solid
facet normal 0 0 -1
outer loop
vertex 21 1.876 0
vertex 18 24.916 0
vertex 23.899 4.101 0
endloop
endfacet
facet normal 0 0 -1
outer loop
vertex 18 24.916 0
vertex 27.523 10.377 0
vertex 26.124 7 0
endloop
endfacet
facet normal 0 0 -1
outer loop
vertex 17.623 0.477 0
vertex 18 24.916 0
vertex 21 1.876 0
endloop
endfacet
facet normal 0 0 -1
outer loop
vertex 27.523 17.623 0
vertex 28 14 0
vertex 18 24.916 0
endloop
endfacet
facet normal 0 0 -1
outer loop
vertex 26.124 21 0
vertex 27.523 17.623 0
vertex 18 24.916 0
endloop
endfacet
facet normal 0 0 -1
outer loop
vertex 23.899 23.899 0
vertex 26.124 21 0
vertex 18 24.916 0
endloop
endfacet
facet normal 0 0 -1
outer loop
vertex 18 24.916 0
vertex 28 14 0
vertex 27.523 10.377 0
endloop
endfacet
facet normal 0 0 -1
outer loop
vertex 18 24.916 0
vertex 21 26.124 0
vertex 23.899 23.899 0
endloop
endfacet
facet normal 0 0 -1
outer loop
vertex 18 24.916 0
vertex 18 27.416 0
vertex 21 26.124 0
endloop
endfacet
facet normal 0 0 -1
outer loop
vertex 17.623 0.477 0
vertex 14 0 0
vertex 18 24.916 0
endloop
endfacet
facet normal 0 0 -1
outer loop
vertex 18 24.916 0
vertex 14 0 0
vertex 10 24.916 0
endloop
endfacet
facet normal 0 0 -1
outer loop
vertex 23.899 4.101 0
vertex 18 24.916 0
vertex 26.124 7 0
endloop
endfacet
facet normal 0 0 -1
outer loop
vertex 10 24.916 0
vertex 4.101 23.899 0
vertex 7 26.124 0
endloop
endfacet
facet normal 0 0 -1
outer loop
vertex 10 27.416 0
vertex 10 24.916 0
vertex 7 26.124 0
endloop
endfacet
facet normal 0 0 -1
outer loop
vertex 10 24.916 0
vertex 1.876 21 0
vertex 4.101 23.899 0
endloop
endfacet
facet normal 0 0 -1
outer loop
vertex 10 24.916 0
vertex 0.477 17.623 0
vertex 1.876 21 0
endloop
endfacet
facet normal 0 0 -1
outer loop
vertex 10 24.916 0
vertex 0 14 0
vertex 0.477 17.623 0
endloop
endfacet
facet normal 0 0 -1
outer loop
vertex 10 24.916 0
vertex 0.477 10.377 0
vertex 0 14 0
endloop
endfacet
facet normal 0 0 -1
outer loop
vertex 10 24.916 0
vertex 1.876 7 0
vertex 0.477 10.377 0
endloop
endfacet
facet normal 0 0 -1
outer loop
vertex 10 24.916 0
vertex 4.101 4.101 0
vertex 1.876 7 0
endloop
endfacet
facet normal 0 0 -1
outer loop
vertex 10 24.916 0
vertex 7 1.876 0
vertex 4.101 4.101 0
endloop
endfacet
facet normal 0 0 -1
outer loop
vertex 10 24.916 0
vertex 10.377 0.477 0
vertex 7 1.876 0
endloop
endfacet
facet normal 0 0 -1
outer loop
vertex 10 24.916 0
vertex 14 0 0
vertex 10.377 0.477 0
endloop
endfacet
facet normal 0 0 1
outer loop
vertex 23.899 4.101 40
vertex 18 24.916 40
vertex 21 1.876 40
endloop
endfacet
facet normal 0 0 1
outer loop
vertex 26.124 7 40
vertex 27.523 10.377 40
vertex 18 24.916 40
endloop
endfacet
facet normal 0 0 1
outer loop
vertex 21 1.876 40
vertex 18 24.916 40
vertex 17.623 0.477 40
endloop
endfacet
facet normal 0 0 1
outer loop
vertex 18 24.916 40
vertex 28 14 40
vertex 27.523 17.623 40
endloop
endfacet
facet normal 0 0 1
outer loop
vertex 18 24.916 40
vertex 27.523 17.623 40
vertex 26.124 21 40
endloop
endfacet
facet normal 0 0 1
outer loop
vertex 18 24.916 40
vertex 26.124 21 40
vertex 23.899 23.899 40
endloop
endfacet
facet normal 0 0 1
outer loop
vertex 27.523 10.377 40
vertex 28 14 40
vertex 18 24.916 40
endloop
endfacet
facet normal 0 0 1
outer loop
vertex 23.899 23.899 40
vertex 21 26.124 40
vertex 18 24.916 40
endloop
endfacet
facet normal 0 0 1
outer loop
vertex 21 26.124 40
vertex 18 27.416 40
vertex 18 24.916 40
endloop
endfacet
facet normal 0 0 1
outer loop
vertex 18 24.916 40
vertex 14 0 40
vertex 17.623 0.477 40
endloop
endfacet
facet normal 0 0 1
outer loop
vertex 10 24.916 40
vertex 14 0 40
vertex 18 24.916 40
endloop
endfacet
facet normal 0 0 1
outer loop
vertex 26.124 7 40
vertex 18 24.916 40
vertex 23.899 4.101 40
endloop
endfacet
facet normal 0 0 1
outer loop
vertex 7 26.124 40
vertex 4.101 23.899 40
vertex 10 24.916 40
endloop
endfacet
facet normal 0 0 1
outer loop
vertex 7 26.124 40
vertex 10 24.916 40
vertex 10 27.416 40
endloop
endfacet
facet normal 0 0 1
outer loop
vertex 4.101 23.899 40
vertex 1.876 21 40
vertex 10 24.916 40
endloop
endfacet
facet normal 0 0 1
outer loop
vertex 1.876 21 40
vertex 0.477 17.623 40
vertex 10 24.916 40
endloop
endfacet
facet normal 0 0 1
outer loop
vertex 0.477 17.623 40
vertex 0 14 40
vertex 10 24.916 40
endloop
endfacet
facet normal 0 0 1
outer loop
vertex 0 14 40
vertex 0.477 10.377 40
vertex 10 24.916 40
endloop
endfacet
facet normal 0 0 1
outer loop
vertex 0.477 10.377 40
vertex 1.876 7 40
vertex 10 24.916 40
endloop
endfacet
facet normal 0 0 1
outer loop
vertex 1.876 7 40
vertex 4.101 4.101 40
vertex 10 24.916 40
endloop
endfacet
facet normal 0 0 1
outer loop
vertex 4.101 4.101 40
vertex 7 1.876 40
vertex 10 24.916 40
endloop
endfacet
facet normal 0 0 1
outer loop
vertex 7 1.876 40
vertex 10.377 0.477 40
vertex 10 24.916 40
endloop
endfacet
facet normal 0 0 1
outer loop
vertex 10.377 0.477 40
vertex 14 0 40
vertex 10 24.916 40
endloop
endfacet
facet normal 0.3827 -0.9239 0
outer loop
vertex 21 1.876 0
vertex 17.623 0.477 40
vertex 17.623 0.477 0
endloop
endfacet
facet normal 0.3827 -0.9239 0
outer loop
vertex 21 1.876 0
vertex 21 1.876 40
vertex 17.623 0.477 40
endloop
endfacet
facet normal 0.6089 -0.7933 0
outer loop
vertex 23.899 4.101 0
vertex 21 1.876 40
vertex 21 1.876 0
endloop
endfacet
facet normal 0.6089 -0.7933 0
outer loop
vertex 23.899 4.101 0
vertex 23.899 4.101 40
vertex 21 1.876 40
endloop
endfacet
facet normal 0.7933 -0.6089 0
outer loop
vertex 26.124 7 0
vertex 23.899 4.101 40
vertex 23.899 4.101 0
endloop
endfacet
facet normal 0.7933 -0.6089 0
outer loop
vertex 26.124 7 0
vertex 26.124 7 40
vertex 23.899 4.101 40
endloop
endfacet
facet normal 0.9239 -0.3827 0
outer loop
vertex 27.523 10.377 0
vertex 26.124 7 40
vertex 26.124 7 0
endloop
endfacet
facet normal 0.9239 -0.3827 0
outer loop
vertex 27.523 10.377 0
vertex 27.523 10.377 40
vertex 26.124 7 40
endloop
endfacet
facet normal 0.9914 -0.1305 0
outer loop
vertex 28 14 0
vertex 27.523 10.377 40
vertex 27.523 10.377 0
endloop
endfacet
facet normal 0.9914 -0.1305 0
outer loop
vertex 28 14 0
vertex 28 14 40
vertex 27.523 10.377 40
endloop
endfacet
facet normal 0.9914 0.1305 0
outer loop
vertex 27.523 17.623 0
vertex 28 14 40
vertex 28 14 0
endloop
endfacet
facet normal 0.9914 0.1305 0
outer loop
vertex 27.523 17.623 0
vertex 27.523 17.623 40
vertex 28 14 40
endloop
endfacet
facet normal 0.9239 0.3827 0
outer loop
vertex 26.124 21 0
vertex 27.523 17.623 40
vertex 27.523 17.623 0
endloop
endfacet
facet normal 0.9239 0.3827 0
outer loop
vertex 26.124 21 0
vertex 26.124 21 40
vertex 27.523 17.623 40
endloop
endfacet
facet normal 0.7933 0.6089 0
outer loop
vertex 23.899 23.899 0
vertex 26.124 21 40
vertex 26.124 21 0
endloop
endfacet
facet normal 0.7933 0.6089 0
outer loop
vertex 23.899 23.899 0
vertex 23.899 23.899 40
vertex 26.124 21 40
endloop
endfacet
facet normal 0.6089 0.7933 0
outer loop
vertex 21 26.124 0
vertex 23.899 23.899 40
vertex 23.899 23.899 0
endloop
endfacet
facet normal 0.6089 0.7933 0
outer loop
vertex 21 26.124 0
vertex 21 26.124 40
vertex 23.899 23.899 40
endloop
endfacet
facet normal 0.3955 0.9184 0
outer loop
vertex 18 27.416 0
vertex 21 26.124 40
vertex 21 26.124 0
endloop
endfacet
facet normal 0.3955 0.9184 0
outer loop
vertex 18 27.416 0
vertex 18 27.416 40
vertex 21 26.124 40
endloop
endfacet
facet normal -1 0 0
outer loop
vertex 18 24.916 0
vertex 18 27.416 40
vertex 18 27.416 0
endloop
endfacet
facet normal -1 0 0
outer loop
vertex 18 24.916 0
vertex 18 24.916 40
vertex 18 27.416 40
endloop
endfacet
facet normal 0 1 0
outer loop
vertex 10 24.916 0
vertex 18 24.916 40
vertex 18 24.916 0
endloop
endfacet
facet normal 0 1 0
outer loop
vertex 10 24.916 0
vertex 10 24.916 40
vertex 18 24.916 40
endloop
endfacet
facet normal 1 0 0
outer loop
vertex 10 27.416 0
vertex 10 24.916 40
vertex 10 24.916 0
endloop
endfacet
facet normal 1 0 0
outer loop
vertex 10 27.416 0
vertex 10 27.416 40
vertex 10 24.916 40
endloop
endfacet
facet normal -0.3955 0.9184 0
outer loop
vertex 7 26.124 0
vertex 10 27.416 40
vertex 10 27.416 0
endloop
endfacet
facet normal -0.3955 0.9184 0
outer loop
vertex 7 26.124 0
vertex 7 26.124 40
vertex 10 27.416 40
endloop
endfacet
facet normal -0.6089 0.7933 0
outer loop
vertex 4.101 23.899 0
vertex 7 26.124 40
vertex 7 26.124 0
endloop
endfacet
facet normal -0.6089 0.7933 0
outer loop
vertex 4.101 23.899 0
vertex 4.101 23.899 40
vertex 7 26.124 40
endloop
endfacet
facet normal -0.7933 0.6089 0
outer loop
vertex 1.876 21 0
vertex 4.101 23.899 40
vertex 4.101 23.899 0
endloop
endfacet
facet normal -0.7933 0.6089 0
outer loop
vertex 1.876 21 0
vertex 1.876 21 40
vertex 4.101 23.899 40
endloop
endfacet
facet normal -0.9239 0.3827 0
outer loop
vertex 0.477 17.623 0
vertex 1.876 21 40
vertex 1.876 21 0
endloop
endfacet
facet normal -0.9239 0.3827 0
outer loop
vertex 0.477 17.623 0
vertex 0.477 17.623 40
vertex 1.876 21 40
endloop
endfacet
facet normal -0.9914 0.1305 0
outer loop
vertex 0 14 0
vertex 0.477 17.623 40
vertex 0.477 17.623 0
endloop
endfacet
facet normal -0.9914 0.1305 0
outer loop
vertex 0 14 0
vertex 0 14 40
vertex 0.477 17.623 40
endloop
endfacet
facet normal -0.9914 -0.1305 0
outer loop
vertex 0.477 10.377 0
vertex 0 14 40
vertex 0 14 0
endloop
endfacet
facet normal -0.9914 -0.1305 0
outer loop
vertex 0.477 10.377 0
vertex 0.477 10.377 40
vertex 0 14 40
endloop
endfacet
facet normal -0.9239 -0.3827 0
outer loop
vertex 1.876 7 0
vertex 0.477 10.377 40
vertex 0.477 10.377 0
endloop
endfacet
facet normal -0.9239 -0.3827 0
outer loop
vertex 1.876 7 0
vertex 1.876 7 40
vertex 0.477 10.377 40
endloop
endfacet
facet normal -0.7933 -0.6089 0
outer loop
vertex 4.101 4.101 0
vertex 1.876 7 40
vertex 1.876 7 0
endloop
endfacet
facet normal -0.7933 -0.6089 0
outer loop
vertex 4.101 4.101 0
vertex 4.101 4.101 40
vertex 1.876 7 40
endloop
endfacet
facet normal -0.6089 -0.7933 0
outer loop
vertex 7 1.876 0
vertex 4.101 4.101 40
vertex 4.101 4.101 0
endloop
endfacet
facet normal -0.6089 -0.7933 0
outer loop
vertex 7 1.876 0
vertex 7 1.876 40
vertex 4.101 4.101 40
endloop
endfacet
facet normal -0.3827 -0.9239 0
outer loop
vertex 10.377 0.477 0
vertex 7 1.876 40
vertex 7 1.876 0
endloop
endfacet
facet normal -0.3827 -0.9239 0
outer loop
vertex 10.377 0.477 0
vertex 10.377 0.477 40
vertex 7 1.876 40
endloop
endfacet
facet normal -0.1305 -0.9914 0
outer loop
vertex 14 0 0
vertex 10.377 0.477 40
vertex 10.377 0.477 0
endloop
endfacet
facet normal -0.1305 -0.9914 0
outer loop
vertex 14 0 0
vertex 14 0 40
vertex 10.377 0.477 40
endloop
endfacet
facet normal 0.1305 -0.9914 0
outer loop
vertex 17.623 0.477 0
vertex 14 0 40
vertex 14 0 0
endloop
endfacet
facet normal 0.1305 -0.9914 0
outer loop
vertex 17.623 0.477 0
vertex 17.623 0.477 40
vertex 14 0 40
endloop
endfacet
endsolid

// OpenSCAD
$fn = 32;

// ----------------------------------------------------------------------
// Keyway shaft: d28 shaft, key 8 x 2.5 mm
// ----------------------------------------------------------------------

// --- parameters (mm) ---
shaft_r = 14;             // shaft radius
key_w = 8;                // keyway width
key_d = 2.5;              // keyway depth below the surface line
plate_t = 40;             // shaft length, Z (extrusion height)

shaft_d = 2 * shaft_r;  // shaft diameter
circle_step = 15;  // polygon sampling step, degrees

profile = [[7, 26.124], [4.101, 23.899], [1.876, 21], [0.477, 17.623], [0, 14], [0.477, 10.377], [1.876, 7], [4.101, 4.101], [7, 1.876], [10.377, 0.477], [14, 0], [17.623, 0.477], [21, 1.876], [23.899, 4.101], [26.124, 7], [27.523, 10.377], [28, 14], [27.523, 17.623], [26.124, 21], [23.899, 23.899], [21, 26.124], [18, 27.416], [18, 24.916], [10, 24.916], [10, 27.416]];  // primary outline, 25 points, counter clockwise

// --- the one profile operation ---
linear_extrude(height = plate_t) polygon(points = profile);
